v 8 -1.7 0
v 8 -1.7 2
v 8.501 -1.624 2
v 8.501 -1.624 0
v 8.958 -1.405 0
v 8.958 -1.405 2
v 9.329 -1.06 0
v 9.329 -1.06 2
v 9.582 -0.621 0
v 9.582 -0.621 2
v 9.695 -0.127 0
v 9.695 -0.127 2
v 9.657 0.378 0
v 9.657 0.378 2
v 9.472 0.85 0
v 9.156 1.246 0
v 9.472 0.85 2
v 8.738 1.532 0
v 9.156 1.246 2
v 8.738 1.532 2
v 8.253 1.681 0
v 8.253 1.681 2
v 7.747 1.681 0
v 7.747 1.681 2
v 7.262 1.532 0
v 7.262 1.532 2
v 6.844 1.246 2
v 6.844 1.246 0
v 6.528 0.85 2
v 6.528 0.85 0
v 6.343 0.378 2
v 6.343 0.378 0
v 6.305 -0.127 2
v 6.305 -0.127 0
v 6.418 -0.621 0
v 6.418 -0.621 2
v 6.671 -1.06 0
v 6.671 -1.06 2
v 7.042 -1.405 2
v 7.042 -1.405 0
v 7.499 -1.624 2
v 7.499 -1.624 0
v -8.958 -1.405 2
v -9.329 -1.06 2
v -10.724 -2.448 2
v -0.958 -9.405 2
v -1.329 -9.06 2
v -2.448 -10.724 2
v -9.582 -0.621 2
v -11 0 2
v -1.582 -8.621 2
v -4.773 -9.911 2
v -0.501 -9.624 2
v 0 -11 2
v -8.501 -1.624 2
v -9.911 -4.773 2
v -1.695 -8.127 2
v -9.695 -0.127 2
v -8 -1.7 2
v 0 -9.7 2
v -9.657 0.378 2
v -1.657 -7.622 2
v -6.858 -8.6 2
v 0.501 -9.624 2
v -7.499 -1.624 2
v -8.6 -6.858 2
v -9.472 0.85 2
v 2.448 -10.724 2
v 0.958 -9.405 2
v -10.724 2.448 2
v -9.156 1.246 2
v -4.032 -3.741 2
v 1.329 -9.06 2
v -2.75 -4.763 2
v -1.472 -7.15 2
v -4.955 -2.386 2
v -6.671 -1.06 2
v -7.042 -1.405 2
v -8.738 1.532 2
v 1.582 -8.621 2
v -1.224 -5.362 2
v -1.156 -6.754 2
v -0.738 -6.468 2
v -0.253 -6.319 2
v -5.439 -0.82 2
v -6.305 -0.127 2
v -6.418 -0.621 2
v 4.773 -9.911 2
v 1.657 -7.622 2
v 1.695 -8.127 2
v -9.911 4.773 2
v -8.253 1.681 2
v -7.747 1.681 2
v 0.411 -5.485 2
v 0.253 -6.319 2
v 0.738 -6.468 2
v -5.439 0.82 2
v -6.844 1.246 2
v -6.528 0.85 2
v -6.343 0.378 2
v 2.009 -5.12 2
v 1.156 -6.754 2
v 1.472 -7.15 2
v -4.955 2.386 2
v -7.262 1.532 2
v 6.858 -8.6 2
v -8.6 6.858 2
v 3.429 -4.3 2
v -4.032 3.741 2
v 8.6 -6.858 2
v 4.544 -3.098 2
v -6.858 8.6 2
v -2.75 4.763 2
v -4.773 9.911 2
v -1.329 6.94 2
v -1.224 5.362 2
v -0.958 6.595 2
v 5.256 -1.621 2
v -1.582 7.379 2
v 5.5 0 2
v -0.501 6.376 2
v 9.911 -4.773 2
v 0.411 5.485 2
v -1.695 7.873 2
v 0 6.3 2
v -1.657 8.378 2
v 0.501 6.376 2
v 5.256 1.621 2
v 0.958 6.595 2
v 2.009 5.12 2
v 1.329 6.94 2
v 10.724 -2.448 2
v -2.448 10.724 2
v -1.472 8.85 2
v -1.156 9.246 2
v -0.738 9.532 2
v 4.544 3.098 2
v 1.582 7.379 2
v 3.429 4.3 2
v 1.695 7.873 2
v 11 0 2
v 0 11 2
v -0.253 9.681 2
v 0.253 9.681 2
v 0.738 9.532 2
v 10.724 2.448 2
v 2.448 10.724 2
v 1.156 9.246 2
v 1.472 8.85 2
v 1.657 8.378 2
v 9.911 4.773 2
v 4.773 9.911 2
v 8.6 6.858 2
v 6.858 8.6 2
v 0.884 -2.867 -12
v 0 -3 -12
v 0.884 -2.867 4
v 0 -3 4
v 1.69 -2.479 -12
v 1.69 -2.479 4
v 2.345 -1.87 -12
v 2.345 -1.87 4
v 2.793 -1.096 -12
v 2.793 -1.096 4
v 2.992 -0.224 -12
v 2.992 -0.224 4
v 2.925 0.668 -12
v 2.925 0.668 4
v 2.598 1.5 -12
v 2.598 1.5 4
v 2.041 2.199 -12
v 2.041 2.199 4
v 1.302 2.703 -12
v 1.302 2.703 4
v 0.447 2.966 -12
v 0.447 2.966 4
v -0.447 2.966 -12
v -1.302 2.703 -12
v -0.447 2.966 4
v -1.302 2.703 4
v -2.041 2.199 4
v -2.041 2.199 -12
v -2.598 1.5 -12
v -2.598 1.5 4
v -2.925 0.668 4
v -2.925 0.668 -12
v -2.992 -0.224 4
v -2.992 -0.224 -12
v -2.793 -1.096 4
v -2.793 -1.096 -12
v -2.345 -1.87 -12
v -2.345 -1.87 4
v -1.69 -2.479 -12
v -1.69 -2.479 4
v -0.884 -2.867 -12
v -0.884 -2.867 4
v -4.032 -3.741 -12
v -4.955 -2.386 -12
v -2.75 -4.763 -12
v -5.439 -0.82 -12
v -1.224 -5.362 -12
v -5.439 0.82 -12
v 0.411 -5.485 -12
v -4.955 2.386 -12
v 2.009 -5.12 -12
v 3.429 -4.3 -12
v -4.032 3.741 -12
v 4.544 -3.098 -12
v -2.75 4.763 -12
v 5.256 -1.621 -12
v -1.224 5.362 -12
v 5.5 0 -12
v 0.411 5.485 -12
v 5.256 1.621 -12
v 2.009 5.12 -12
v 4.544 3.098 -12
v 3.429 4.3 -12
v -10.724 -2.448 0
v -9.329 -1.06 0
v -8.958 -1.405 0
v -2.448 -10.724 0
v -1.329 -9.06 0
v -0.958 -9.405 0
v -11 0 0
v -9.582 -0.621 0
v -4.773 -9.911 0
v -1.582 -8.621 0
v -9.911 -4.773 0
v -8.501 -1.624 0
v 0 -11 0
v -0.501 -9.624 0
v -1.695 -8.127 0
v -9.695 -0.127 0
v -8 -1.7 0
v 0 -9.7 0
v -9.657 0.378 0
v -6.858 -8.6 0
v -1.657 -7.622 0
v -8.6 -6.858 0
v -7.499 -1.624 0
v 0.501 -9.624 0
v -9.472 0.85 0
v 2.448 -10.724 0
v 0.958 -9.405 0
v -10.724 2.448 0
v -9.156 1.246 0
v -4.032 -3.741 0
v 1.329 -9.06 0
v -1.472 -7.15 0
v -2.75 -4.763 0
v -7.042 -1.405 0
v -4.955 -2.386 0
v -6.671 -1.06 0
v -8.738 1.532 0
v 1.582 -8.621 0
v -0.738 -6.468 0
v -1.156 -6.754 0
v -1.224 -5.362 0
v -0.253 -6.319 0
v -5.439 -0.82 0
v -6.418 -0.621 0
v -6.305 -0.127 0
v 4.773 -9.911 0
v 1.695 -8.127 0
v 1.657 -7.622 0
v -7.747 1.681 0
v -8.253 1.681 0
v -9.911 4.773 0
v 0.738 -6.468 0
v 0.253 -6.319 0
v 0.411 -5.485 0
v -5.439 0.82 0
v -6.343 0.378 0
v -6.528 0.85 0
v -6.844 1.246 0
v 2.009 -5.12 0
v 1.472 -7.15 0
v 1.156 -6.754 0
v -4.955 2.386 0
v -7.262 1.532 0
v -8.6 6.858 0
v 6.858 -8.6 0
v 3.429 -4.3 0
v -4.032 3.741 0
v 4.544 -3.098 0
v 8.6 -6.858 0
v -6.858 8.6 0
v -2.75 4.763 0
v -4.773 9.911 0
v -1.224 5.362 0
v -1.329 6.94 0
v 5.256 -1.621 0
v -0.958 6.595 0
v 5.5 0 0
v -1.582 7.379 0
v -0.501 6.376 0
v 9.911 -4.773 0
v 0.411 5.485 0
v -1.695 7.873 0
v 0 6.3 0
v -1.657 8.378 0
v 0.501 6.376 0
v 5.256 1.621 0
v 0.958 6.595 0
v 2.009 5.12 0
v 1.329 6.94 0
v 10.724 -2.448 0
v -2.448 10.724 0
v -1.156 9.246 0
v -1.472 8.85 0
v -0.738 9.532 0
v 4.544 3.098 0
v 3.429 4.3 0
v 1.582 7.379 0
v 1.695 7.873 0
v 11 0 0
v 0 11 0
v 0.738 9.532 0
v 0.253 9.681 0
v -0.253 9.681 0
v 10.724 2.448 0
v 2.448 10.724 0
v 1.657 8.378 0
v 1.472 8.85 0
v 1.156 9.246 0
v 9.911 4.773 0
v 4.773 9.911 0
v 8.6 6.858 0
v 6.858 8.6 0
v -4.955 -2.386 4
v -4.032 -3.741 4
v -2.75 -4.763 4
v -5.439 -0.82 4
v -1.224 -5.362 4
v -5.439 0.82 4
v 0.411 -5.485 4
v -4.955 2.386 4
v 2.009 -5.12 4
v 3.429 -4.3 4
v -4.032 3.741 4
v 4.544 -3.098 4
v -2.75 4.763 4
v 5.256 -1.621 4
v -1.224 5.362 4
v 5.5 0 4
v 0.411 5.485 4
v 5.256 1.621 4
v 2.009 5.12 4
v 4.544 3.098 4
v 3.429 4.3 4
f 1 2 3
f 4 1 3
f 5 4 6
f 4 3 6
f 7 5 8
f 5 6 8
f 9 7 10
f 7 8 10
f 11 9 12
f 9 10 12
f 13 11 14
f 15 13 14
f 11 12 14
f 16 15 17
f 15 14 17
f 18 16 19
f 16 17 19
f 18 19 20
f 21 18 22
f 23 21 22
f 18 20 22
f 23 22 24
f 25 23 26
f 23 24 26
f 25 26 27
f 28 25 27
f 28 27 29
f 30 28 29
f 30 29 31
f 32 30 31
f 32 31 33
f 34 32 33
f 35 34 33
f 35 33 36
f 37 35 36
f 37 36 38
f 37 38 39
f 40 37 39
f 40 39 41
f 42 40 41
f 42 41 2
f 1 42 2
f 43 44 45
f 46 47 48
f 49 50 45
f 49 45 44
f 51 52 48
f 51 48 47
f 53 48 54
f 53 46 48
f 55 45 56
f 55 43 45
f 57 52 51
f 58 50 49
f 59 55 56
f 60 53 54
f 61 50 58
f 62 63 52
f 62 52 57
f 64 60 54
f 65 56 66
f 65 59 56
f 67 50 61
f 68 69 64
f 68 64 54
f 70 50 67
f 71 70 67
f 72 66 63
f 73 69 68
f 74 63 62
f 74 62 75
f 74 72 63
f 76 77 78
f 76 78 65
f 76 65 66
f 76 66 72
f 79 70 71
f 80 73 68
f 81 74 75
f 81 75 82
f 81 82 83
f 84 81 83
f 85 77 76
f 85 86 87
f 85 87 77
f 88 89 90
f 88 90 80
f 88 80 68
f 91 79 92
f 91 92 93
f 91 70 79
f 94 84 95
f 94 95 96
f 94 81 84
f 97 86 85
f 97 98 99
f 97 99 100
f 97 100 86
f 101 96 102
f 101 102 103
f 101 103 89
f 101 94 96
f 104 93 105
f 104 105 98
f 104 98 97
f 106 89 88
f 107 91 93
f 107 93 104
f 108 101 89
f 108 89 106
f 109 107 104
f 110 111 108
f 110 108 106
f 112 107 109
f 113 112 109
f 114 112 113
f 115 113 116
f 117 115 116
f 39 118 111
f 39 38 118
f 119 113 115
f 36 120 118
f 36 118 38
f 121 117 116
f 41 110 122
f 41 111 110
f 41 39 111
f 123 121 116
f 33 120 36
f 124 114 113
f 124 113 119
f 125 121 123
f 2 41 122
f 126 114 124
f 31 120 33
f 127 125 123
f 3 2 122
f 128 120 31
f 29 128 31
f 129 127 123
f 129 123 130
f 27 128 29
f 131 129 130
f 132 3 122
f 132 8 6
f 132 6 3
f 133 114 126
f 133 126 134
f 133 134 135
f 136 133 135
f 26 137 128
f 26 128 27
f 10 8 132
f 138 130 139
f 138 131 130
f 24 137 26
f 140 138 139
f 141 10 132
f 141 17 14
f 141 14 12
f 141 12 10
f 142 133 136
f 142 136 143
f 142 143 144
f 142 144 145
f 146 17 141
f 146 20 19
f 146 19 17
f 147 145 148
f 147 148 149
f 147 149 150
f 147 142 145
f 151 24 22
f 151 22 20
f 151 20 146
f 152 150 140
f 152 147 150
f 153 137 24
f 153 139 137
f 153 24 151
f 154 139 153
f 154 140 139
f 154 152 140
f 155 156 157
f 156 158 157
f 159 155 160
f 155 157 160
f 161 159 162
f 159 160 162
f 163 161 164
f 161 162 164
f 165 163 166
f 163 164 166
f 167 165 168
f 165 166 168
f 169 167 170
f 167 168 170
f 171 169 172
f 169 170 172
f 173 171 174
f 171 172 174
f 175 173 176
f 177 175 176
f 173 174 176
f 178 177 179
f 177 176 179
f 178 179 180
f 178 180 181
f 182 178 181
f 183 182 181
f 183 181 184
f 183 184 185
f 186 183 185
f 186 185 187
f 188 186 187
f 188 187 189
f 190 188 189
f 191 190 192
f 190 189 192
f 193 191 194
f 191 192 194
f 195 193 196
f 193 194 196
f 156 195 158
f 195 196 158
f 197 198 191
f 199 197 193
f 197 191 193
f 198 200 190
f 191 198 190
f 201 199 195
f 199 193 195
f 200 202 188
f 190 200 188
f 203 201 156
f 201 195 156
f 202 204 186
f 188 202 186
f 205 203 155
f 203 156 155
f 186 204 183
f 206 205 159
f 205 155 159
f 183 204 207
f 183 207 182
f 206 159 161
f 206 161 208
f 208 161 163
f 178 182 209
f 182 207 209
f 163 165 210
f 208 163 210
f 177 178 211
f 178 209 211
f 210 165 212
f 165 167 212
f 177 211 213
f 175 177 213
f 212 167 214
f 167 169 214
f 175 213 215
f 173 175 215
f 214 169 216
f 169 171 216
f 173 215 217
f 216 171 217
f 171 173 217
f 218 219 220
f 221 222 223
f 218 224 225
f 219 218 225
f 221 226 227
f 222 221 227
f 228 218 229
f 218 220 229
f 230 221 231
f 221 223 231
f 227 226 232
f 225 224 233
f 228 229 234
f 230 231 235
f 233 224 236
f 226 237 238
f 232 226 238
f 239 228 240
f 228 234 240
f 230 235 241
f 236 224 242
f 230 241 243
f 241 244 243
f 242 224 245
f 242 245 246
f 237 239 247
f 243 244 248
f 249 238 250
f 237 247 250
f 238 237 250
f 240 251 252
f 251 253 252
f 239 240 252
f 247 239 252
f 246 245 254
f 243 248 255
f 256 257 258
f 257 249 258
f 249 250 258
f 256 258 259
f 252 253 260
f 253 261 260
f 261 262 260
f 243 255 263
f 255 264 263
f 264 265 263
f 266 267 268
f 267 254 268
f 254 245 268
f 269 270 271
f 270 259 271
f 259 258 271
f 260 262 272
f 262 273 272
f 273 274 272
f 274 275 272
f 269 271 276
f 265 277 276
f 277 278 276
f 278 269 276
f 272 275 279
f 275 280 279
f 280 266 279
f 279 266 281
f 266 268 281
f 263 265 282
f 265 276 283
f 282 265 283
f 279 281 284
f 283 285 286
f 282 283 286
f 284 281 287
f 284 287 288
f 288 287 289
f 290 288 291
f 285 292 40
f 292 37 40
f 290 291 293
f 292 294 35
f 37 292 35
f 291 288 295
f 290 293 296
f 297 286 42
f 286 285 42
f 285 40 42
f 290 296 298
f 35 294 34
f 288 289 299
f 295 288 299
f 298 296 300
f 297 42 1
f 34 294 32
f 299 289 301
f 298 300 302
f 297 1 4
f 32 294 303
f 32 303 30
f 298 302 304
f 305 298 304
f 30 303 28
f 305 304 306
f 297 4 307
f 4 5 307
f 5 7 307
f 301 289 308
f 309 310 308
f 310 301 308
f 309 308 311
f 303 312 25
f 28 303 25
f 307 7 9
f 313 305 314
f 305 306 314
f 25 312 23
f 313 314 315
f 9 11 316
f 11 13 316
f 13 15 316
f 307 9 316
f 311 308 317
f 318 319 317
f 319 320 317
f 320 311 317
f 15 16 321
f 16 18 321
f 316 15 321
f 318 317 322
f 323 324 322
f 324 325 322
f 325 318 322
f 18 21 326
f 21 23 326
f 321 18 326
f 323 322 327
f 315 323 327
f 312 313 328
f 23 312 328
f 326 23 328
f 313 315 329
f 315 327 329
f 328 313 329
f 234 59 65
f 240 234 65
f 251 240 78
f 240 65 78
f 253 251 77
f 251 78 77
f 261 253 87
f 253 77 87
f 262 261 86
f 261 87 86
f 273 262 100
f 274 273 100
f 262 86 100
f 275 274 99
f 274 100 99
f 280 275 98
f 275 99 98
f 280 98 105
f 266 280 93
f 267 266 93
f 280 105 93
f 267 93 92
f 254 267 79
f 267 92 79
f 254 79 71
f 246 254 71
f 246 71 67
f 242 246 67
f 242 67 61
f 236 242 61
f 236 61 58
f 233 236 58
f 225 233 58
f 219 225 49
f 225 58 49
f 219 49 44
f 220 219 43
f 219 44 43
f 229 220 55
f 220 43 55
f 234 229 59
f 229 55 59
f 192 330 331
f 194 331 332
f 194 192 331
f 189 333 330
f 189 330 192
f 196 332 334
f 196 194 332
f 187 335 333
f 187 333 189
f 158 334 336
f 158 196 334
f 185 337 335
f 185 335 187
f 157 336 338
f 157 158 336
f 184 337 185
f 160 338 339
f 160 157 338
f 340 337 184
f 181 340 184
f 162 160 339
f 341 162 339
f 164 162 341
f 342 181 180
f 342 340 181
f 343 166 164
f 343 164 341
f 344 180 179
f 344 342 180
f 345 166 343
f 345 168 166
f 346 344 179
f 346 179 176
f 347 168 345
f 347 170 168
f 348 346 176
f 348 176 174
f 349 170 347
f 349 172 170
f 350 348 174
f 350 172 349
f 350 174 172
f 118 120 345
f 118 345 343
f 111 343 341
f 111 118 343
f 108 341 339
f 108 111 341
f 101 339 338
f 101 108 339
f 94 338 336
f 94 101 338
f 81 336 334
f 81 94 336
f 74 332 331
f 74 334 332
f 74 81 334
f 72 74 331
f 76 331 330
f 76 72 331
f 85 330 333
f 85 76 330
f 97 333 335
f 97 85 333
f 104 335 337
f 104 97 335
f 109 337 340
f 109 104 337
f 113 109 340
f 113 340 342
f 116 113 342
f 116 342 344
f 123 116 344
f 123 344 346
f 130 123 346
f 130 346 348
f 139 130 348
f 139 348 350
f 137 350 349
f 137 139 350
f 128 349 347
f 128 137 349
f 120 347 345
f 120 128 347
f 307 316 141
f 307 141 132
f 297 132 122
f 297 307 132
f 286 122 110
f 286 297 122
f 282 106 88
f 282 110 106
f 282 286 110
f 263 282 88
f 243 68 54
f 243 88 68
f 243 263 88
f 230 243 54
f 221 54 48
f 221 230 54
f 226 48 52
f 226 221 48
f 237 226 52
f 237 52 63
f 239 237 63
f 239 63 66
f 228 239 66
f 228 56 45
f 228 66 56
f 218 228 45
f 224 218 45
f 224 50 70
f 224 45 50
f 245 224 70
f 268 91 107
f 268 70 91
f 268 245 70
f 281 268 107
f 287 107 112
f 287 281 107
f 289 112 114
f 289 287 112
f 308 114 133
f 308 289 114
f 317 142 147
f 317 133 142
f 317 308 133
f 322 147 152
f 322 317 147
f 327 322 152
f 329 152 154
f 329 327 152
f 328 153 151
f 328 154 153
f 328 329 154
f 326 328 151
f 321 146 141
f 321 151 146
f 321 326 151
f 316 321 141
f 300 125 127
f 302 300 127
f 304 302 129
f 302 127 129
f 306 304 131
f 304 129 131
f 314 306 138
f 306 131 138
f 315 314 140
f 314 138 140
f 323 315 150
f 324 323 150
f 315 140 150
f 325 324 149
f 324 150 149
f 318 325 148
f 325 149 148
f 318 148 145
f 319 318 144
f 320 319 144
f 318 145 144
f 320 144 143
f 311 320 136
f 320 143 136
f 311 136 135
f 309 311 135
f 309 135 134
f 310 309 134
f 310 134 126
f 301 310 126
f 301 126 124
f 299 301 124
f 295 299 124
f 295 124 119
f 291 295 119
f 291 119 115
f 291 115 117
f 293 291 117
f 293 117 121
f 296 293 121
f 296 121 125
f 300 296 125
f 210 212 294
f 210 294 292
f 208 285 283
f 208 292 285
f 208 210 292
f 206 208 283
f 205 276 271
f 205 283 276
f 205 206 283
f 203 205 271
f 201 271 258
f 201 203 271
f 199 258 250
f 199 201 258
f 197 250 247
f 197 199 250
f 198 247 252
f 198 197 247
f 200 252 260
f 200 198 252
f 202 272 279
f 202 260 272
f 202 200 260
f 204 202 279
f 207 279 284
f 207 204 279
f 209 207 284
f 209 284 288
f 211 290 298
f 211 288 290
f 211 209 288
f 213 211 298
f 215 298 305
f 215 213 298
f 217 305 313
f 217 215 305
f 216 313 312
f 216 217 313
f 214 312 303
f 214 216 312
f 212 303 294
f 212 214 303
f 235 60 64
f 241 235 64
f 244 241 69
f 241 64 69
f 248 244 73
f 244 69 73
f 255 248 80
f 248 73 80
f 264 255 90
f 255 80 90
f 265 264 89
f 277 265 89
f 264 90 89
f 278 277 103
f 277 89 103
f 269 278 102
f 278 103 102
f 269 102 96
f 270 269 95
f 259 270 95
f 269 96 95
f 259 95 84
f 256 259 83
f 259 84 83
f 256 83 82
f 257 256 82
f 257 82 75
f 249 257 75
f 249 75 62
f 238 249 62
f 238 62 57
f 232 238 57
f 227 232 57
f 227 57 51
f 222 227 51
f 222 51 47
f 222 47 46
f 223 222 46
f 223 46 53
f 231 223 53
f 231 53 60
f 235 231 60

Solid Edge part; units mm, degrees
sketch "Sketch1" plane through (0, 0, 0) normal (0, -1, 0) x (1, 0, 0)
  line L0 (0, 4) -> (5.5, 4)
  line L1 (5.5, 4) -> (5.5, 2)
  line L2 (5.5, 2) -> (11, 2)
  line L3 (11, 2) -> (11, 0)
  line L4 (11, 0) -> (5.5, 0)
  line L5 (5.5, 0) -> (5.5, -12)
  line L6 (5.5, -12) -> (0, -12)
  dimension "D1" = 16
  dimension "D2" = 2
  dimension "D3" = 12
revolve "RevolvedProtrusion1" add sketch "Sketch1" angle 360 about axis through (0, 0, -12) along (0, 0, 1)
hole "Hole1" at (0, 0, 4) direction (0, 0, -1) diameter 6 end up to next
hole "Hole_2" at (-8, 0, 2) direction (0, 0, -1) diameter 3.4 end up to next
hole "Hole2" at (8, 0, 2) direction (0, 0, -1) diameter 3.4 end up to next
hole "Hole3" at (0, 8, 2) direction (0, 0, -1) diameter 3.4 end up to next
hole "Hole4" at (0, -8, 2) direction (0, 0, -1) diameter 3.4 end up to next
properties part number "A2.N2" material "Brass, yellow brass"
